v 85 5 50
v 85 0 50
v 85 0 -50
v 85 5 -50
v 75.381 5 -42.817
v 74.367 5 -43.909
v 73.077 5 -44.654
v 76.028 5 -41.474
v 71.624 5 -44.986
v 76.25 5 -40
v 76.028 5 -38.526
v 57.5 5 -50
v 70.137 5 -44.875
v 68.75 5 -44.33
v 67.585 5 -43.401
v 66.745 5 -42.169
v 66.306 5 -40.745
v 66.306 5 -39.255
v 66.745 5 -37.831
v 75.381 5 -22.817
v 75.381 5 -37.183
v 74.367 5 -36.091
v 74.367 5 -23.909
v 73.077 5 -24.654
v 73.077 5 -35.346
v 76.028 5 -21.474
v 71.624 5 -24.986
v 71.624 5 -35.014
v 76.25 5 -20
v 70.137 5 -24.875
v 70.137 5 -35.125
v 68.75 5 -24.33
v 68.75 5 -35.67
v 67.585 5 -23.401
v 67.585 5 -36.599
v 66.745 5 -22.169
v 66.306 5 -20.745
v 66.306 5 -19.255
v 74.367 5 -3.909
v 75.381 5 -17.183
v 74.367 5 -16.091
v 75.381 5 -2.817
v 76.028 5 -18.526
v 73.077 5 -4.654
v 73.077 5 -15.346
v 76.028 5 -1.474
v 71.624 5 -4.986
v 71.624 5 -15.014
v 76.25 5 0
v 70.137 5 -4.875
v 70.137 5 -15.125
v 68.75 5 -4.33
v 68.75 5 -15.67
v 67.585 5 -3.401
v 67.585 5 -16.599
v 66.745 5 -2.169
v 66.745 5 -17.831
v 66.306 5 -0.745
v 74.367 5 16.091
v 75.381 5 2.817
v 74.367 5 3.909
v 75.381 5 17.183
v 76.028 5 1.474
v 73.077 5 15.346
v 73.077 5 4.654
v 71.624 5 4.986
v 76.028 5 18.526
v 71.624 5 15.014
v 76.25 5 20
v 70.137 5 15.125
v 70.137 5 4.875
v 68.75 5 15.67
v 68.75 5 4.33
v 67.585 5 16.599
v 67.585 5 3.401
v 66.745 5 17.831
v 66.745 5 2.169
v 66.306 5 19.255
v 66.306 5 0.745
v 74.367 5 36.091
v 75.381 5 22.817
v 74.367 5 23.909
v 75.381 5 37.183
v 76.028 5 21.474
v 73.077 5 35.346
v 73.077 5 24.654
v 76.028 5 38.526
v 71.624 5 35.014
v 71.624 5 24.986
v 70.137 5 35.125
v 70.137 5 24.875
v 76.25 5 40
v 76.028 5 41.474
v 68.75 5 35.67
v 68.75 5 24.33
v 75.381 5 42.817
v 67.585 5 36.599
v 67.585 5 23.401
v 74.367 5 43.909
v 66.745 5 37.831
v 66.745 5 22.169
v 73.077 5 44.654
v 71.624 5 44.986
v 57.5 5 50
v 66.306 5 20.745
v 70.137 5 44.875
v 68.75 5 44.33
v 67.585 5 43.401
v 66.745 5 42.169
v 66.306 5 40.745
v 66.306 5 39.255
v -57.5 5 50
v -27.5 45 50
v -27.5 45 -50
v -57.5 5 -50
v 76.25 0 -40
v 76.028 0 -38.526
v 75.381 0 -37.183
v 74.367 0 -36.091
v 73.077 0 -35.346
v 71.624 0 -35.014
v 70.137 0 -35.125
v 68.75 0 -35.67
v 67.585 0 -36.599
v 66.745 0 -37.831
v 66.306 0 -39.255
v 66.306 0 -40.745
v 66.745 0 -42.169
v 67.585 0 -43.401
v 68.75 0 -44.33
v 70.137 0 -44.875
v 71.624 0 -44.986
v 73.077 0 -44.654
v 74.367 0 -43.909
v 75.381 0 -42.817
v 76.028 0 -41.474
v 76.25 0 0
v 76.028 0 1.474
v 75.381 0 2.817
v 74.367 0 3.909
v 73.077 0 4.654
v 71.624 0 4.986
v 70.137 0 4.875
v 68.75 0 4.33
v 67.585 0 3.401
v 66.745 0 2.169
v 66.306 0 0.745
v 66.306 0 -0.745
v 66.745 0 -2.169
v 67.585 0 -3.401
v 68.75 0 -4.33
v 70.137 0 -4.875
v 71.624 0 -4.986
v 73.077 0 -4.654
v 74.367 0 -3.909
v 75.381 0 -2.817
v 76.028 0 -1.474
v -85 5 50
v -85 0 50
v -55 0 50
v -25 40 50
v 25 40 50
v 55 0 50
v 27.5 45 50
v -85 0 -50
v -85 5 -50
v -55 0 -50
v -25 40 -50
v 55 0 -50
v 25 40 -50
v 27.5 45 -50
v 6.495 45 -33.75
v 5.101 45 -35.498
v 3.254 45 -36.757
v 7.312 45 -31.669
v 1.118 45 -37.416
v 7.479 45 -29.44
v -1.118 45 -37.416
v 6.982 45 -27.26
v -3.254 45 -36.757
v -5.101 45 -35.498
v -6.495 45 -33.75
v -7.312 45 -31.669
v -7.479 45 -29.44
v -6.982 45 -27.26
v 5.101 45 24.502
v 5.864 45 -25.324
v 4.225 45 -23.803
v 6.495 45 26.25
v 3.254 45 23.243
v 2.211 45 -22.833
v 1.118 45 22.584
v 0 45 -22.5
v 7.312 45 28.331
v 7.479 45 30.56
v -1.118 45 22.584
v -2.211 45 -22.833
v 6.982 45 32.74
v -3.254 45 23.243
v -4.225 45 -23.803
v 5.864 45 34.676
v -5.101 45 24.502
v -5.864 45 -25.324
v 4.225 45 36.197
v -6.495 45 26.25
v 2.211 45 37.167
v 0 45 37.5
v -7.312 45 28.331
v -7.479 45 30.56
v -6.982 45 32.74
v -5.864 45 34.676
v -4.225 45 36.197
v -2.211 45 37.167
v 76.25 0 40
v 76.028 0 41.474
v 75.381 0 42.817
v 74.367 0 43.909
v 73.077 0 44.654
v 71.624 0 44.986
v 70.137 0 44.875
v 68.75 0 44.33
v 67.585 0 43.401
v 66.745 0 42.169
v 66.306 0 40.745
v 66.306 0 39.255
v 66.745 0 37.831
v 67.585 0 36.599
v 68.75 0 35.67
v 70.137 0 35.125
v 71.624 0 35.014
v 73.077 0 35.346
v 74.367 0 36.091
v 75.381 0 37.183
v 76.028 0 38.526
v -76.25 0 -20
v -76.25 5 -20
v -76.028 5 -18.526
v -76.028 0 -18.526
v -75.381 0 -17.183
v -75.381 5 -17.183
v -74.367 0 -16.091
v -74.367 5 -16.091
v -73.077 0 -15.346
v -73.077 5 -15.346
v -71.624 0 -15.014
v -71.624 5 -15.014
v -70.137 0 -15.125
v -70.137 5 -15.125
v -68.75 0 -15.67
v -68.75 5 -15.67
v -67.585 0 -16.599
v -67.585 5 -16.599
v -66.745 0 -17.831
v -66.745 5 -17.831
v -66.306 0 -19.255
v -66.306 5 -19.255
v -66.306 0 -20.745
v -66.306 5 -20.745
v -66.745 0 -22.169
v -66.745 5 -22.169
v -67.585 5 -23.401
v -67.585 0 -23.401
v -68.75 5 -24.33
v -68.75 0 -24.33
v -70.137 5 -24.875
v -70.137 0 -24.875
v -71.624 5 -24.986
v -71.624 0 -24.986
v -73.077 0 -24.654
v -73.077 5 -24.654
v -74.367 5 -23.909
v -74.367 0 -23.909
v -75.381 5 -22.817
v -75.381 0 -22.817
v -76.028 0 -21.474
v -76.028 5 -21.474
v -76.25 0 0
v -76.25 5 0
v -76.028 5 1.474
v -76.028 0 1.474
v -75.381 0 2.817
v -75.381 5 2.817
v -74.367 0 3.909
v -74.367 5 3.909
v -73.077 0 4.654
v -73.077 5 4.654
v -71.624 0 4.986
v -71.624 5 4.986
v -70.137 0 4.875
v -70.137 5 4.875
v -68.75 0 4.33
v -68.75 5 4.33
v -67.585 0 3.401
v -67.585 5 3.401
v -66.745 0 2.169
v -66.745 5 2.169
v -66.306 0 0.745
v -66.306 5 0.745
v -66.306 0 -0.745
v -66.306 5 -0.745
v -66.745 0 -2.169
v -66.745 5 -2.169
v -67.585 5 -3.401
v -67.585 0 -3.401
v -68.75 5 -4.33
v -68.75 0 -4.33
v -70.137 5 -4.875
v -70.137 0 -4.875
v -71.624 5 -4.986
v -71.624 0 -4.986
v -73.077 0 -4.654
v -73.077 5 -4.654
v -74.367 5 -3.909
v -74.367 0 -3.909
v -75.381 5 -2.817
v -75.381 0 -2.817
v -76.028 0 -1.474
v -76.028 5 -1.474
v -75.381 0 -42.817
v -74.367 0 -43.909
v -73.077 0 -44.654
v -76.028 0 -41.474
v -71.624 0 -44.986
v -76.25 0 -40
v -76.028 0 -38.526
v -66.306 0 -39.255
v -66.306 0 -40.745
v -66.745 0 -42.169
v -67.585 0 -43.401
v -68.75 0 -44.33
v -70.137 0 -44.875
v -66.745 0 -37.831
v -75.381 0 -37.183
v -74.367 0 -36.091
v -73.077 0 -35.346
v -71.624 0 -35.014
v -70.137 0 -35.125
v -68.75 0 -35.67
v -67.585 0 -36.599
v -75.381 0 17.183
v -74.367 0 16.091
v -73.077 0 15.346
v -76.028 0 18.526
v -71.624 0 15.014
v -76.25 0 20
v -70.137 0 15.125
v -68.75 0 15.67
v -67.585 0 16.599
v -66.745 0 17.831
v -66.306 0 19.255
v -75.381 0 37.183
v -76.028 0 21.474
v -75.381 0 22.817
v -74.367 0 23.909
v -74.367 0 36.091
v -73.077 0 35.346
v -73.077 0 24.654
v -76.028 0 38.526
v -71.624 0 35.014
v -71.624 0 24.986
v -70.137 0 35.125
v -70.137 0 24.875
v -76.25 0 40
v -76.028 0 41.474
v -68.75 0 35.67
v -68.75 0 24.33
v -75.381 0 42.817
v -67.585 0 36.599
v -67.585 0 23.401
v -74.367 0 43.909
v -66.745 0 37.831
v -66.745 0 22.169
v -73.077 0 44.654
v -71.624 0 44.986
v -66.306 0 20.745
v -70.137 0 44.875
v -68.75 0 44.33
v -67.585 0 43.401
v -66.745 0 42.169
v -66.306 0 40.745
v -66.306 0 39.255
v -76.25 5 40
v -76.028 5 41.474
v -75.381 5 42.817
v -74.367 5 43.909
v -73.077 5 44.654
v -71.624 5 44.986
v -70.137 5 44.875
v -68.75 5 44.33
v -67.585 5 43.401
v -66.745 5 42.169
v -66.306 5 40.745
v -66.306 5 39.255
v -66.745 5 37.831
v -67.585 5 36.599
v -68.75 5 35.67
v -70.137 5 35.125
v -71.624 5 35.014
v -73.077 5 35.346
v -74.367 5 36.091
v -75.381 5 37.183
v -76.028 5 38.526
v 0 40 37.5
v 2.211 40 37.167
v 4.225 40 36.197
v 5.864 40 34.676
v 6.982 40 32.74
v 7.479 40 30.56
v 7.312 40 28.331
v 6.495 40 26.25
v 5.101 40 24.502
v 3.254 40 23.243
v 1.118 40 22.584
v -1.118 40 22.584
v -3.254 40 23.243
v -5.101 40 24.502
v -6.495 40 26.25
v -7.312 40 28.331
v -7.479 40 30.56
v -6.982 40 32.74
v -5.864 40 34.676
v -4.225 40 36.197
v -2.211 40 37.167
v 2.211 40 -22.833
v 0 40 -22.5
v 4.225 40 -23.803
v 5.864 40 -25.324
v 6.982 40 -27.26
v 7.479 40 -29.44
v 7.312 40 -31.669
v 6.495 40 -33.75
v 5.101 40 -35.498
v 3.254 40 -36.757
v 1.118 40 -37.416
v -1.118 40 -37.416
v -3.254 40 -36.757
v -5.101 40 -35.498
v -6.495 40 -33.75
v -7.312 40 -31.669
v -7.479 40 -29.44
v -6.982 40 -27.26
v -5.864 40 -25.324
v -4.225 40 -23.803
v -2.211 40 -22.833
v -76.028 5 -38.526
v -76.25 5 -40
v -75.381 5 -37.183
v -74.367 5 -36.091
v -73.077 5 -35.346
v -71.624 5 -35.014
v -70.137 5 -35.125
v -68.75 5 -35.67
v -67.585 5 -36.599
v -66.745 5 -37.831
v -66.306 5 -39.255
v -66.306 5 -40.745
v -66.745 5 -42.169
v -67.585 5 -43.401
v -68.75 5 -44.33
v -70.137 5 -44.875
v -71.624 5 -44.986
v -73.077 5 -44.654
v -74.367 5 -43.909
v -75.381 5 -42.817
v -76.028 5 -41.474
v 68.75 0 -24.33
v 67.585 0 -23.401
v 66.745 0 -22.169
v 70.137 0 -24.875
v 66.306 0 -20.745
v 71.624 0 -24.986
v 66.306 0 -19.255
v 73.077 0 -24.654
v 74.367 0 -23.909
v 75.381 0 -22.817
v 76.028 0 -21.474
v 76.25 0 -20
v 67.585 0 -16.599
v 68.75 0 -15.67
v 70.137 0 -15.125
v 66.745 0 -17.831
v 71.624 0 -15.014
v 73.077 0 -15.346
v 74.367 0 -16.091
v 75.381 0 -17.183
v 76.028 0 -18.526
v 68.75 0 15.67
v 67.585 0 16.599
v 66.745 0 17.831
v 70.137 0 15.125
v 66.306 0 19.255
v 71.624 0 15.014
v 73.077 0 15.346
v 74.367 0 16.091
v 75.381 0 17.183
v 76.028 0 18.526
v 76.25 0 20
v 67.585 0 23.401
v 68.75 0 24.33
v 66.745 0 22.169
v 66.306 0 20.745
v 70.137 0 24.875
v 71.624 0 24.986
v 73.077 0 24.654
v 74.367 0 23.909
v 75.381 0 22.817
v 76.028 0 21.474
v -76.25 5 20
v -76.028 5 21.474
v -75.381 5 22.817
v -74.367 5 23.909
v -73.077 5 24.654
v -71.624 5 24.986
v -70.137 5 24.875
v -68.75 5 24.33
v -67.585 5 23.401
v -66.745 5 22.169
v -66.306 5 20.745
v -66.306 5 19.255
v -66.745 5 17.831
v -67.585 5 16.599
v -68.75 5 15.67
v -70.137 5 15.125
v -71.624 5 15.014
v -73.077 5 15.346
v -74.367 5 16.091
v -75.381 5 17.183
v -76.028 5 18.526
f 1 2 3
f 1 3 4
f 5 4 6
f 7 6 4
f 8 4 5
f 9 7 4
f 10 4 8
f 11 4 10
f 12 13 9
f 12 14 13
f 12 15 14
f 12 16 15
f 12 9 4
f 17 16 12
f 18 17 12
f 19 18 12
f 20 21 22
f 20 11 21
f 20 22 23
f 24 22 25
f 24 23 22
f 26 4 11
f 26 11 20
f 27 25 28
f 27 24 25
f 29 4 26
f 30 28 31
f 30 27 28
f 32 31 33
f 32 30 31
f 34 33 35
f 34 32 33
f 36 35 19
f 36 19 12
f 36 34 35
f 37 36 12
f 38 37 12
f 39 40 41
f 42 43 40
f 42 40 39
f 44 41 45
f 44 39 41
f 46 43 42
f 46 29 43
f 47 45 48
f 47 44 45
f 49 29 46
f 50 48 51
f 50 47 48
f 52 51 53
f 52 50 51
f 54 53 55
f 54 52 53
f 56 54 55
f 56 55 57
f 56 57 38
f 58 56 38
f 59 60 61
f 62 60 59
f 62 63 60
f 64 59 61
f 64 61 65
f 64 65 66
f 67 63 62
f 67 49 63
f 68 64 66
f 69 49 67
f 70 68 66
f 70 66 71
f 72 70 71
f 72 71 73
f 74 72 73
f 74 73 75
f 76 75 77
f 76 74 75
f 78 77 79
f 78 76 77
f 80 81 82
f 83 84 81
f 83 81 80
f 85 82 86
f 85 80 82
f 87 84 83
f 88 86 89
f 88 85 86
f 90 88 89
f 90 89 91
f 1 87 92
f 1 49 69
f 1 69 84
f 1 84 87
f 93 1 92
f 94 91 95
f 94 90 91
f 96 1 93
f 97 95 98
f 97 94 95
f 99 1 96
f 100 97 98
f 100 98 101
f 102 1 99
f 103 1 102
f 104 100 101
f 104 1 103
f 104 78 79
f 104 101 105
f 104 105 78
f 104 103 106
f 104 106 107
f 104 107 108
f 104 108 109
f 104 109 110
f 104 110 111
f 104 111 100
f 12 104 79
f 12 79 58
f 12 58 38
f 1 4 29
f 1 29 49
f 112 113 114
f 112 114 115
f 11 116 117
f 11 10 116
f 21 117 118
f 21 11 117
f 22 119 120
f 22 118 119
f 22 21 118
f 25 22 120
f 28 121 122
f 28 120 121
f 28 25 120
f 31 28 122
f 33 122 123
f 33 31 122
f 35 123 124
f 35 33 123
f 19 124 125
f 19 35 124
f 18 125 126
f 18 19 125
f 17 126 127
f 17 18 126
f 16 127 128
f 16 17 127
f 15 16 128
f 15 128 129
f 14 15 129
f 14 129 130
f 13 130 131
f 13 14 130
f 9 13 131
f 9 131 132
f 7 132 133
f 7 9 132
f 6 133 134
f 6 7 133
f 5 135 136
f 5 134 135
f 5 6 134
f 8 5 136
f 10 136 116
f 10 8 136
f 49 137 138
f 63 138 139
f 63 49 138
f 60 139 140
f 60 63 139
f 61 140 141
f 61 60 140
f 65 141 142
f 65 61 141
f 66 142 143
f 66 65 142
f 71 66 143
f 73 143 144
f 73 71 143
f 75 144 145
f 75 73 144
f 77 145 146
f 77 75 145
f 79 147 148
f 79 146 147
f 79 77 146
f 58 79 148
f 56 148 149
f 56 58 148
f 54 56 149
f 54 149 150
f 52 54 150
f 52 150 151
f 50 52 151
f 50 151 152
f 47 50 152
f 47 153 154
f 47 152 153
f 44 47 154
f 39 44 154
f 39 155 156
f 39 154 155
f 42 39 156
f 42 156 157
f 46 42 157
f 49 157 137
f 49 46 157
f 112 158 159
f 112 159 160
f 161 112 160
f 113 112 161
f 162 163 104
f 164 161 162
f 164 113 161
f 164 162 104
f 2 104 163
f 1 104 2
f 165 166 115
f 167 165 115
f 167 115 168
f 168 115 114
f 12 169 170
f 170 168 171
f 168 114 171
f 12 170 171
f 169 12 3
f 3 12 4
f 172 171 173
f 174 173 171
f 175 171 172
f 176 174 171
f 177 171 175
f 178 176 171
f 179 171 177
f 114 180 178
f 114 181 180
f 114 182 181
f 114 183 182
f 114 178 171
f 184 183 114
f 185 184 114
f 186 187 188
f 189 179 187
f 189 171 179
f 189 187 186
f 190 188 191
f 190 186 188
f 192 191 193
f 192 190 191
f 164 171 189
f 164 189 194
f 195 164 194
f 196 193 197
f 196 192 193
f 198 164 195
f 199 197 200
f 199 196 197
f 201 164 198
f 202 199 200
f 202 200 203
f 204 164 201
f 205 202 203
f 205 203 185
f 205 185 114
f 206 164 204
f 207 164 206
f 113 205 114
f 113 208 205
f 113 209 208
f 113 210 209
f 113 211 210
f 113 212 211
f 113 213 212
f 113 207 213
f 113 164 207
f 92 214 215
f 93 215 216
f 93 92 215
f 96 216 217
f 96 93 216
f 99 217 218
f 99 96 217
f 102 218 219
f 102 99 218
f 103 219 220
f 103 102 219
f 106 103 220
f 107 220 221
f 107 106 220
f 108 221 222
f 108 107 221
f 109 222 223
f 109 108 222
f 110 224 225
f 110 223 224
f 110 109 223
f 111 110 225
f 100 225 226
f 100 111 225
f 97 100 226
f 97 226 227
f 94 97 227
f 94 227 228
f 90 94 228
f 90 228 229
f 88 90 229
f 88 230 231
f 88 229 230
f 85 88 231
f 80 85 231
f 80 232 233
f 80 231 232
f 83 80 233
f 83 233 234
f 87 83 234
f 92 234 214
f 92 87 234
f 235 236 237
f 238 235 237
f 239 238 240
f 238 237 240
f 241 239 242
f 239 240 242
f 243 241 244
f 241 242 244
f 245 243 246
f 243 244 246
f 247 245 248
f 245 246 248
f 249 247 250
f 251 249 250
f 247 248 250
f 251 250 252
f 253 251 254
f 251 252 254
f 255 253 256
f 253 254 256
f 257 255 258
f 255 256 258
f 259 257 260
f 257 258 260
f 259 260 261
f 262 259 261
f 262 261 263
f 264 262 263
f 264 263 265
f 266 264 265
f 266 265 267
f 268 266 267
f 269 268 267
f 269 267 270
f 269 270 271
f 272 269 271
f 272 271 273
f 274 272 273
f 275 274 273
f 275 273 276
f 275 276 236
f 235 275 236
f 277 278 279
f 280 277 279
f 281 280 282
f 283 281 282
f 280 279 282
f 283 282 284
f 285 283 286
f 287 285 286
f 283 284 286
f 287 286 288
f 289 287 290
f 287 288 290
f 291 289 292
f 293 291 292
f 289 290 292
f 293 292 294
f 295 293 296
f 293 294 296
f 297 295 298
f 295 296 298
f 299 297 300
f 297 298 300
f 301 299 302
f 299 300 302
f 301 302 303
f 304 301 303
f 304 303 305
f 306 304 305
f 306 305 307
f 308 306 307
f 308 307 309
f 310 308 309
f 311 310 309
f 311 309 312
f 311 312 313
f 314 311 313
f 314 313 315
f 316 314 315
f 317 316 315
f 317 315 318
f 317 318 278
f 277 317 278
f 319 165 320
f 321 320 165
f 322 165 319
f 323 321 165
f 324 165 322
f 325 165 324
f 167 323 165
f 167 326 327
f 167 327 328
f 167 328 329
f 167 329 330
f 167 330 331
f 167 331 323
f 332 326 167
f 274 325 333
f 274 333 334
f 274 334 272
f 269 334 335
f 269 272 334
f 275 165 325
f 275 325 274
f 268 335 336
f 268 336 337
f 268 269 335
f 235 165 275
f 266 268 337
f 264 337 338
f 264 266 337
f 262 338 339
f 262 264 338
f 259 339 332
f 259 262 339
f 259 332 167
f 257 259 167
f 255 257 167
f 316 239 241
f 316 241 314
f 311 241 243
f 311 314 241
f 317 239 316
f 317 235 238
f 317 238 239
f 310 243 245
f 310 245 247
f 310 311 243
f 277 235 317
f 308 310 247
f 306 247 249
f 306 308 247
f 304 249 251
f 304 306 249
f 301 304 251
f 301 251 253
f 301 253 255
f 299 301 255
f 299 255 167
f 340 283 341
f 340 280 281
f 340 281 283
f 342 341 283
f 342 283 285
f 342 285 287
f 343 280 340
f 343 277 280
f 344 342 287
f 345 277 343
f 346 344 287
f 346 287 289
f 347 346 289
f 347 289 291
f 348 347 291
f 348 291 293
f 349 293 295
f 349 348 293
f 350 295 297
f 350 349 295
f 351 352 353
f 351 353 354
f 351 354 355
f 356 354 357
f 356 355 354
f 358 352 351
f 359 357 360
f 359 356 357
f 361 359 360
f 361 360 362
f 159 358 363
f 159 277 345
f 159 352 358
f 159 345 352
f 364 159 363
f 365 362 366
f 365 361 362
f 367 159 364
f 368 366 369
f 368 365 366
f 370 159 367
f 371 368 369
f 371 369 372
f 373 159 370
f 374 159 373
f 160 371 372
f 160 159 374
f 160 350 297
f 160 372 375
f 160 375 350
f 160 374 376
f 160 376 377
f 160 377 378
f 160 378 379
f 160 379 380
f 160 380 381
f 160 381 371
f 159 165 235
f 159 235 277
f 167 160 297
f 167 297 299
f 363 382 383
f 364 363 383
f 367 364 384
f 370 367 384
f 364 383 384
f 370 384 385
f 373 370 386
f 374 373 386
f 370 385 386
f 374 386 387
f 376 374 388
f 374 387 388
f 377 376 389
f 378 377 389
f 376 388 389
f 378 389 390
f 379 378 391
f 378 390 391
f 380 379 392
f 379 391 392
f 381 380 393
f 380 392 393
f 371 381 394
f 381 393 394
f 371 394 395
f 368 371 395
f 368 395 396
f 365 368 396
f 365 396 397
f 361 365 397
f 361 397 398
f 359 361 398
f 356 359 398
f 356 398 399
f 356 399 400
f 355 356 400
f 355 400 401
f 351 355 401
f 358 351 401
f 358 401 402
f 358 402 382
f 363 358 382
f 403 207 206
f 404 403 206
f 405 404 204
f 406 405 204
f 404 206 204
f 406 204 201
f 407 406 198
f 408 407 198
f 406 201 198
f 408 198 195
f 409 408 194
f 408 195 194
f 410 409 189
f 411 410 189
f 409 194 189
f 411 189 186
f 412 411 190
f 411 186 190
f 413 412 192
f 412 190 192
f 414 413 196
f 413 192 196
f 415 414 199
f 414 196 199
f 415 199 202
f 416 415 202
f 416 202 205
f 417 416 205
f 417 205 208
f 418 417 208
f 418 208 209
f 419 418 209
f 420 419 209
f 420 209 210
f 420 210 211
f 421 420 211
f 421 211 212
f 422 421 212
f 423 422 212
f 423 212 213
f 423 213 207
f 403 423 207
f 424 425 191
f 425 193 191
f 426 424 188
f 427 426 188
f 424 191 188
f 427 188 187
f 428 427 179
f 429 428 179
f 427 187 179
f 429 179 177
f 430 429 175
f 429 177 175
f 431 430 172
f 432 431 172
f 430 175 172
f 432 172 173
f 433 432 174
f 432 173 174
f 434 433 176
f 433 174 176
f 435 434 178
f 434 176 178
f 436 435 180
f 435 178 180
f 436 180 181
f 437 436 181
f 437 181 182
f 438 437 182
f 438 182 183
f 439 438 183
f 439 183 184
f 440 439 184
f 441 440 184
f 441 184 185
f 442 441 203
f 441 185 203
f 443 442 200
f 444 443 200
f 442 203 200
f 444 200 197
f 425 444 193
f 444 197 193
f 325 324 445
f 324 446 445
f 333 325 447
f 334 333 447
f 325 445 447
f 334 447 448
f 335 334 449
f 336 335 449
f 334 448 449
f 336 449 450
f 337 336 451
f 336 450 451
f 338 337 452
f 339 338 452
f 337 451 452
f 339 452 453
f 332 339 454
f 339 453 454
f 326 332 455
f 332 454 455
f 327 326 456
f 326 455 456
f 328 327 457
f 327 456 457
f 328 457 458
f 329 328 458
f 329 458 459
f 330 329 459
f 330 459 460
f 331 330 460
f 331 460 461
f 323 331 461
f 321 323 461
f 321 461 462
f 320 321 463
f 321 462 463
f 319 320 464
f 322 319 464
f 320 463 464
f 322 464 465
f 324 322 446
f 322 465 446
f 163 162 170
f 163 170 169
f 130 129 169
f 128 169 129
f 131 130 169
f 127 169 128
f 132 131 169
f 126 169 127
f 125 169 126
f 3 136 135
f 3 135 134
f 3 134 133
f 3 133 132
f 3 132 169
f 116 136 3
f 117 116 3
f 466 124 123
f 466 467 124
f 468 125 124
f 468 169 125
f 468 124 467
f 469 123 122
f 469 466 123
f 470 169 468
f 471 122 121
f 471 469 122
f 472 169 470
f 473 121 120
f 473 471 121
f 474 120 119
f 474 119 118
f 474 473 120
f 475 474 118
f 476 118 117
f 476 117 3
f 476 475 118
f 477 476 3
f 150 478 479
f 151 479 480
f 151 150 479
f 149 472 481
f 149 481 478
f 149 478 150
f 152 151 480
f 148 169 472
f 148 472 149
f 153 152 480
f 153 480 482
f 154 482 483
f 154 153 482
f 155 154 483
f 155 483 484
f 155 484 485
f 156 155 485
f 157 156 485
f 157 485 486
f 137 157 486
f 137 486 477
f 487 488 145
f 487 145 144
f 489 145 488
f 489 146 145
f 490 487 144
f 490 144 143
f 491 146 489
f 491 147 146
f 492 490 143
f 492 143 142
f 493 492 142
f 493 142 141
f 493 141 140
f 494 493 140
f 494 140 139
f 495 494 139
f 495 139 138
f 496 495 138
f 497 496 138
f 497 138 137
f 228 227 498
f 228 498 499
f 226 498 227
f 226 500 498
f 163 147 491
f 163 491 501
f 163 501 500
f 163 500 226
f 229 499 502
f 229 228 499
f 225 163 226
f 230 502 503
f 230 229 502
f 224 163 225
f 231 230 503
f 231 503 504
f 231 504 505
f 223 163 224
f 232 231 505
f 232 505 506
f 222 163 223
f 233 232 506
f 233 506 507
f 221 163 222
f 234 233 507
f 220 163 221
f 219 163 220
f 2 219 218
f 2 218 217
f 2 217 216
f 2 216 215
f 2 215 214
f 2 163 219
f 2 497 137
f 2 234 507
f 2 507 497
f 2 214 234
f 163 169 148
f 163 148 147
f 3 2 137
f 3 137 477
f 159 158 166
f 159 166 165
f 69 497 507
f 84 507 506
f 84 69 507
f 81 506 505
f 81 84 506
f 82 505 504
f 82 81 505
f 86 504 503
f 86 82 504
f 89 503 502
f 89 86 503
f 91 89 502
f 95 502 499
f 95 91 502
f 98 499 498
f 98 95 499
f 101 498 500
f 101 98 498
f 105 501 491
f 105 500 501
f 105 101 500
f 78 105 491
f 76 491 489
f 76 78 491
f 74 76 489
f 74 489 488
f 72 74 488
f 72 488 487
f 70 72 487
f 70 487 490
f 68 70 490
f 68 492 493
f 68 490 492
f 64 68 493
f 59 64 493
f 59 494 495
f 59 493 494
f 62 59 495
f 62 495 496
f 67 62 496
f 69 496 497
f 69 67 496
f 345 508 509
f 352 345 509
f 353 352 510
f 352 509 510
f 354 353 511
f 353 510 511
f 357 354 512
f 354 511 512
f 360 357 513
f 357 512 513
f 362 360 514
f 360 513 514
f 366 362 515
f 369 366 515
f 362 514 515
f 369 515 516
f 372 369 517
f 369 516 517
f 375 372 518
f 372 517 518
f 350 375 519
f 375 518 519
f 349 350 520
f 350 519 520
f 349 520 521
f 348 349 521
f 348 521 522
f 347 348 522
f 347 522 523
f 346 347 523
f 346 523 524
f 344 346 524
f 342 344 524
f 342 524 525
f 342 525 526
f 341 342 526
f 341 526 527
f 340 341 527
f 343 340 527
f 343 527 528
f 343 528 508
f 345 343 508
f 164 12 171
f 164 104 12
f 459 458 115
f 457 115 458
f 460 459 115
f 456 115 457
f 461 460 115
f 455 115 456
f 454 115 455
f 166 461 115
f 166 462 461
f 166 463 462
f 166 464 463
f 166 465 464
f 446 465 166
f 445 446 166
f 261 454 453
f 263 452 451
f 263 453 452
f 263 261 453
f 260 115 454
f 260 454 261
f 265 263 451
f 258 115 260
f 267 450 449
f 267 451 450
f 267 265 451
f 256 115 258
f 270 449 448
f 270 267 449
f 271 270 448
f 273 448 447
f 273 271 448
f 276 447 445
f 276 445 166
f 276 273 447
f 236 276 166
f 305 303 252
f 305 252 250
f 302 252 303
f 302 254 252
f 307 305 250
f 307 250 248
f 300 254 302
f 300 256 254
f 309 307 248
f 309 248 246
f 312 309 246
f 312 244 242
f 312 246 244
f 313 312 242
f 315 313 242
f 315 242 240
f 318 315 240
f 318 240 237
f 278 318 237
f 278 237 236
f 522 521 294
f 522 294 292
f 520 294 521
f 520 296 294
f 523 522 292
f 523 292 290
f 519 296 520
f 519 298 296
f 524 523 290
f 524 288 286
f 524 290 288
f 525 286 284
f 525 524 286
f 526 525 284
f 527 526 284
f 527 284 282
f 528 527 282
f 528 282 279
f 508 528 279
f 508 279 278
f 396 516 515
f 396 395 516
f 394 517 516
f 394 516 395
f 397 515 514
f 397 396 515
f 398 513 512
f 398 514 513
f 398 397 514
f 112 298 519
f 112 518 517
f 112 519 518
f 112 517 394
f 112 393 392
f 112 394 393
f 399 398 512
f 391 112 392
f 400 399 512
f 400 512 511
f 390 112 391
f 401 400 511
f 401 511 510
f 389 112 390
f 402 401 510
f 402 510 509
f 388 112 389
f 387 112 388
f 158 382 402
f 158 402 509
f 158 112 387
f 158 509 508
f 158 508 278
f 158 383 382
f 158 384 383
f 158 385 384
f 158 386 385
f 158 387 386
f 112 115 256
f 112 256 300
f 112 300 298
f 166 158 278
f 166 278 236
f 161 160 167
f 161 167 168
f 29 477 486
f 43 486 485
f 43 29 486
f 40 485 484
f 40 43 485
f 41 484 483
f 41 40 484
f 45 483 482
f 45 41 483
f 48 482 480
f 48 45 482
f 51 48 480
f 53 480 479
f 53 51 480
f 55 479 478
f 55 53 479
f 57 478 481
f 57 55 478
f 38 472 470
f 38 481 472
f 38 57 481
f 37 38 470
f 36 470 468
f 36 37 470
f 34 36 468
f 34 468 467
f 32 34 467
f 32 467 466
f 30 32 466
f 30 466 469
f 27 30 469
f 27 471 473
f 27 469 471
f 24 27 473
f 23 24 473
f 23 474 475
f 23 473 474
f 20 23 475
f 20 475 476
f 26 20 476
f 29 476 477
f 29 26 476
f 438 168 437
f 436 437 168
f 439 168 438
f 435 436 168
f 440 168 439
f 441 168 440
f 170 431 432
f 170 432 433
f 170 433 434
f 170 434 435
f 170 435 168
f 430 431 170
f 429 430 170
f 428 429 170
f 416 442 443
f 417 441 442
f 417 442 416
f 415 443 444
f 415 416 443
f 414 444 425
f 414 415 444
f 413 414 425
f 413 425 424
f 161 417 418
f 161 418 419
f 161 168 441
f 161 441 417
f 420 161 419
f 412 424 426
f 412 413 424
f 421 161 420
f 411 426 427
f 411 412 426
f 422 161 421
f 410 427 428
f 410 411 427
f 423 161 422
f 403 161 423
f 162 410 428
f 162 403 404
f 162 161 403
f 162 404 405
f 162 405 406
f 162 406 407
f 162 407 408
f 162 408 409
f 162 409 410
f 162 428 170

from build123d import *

# Parameters (mm, degrees)
BOSS_EXTRUDE1_DEPTH = 50
SKETCH2_R           = 5
CUT_EXTRUDE1_DEPTH  = 25
SKETCH3_R           = 7.5
CUT_EXTRUDE2_DEPTH  = 25


with BuildPart() as part:
    # Sketch1 → Boss-Extrude1 (new, symmetric)
    with BuildSketch(Plane.XY):
        Polygon((27.5, 45), (-27.5, 45), (-57.5, 5), (-85, 5), (-85, 0), (-55, 0), (-25, 40), (25, 40), (55, 0), (85, 0), (85, 5), (57.5, 5), align=None)
    extrude(amount=BOSS_EXTRUDE1_DEPTH, both=True)

    # Sketch2 → Cut-Extrude1 (cut, symmetric)
    with BuildSketch(Plane(origin=(0, 5, 0), x_dir=(1, 0, 0), z_dir=(0, 1, 0))):
        with Locations(Location((-71.25, -40, 0), (0, 0, 180))):
            Circle(SKETCH2_R)
        with Locations(Location((-71.25, -20, 0), (0, 0, 180))):
            Circle(SKETCH2_R)
        with Locations(Location((-71.25, 0, 0), (0, 0, 180))):
            Circle(SKETCH2_R)
        with Locations(Location((-71.25, 20, 0), (0, 0, 180))):
            Circle(SKETCH2_R)
        with Locations(Location((-71.25, 40, 0), (0, 0, 180))):
            Circle(SKETCH2_R)
    cut_extrude1 = extrude(amount=CUT_EXTRUDE1_DEPTH, both=True, mode=Mode.SUBTRACT)

    # Mirror1: Cut-Extrude1 across plane
    add(cut_extrude1.mirror(Plane(origin=(0, 0, 0), x_dir=(0, 0, 1), z_dir=(1, 0, 0))), mode=Mode.SUBTRACT)

    # Sketch3 → Cut-Extrude2 (cut, symmetric)
    with BuildSketch(Plane(origin=(0, 45, 0), x_dir=(1, 0, 0), z_dir=(0, 1, 0))):
        with Locations(Location((0, -30, 0), (0, 0, 270))):
            Circle(SKETCH3_R)
        with Locations(Location((0, 30, 0), (0, 0, 270))):
            Circle(SKETCH3_R)
    extrude(amount=CUT_EXTRUDE2_DEPTH, both=True, mode=Mode.SUBTRACT)


solid = part.part
